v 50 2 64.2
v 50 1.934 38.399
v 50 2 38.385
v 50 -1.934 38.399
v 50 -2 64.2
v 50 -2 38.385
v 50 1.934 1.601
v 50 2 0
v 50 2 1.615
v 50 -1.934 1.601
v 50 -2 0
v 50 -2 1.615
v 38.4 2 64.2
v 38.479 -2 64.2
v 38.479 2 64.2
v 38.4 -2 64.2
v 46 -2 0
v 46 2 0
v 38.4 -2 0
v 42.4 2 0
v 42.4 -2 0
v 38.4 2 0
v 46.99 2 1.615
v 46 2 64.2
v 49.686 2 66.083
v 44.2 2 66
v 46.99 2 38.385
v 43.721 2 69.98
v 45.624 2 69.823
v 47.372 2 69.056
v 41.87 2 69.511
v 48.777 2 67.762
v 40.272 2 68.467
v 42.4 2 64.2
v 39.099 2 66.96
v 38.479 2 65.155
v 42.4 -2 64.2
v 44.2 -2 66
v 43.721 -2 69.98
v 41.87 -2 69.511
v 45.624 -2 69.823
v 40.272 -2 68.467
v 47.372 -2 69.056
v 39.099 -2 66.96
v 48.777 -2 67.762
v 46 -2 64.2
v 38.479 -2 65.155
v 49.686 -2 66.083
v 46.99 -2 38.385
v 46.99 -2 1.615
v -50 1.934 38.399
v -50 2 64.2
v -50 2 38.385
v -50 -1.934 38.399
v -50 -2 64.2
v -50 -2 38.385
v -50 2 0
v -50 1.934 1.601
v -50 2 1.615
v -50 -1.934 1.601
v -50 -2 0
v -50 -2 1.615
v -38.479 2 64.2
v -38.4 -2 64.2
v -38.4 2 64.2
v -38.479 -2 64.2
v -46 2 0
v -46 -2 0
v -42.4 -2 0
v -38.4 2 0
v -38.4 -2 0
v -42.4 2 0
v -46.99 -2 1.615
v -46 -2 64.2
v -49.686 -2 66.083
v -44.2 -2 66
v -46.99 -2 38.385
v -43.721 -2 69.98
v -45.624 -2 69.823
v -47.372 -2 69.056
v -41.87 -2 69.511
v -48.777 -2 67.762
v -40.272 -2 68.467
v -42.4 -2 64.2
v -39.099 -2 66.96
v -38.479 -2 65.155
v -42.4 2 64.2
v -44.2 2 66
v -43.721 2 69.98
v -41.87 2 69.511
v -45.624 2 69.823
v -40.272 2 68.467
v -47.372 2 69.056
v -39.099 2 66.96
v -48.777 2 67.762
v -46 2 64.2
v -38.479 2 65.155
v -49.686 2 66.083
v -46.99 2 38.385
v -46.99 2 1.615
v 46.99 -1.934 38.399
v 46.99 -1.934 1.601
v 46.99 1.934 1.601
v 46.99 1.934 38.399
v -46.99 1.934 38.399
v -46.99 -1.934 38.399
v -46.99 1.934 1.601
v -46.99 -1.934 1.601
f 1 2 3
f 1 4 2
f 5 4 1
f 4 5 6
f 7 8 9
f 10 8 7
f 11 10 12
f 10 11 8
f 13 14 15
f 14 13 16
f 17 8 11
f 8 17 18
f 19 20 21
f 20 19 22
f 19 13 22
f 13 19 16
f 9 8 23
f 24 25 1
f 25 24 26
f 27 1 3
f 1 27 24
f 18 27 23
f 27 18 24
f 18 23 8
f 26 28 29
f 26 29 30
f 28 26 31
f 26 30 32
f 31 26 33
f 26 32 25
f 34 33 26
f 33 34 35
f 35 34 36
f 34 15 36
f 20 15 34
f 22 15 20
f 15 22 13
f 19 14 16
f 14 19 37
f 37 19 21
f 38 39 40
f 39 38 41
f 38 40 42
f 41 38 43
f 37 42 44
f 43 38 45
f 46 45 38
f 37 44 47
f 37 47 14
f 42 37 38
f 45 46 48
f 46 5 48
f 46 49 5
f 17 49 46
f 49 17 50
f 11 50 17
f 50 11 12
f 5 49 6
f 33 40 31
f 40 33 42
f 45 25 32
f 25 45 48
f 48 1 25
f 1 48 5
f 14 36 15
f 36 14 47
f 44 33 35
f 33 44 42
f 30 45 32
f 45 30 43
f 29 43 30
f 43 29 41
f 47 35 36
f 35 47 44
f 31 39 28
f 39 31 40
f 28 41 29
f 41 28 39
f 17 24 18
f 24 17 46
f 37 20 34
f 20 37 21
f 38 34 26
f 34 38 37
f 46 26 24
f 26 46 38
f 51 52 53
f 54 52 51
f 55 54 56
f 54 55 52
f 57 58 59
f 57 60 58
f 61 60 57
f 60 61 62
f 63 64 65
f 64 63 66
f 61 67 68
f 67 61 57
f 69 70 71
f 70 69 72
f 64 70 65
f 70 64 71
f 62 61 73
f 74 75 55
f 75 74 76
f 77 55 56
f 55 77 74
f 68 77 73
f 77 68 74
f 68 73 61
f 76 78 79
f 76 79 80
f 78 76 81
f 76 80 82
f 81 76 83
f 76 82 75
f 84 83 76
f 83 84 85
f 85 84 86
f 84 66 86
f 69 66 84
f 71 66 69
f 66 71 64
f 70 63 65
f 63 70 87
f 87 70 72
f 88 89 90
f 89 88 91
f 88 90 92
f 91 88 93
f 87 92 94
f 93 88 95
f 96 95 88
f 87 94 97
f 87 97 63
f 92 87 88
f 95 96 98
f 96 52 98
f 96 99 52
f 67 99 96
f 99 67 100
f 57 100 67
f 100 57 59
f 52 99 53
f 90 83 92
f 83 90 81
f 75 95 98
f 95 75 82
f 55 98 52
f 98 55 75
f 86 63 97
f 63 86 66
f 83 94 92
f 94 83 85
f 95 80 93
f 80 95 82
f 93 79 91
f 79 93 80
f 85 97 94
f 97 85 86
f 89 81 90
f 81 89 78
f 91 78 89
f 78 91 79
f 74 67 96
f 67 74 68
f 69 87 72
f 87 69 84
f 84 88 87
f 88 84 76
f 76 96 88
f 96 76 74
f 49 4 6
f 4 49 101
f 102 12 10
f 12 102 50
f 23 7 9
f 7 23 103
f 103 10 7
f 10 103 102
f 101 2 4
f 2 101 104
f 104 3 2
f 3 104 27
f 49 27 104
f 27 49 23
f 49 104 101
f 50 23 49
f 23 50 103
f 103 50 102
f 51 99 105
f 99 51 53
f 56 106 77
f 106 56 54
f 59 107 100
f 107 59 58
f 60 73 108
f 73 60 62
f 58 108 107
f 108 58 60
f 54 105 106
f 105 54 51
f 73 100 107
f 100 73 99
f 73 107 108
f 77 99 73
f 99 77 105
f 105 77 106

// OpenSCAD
// file: teardrop.scad
// teardrop V2


module teardrop (r=4.5,h=20,top_and_bottom=false)
{
	rotate([-270,0,90])
	linear_extrude(height=h,convexity=10)
	{
		circle(r=r);
		polygon(points=[[0,0],[r*cos(30),r*sin(30)],[0.5*r,r],[-0.5*r,r],[-r*cos(30),r*sin(30)]],
				paths=[[0,1,2,3,4]]);
		if (top_and_bottom)
		polygon(points=[[0,0],[r*cos(30),-r*sin(30)],[0.5*r,-r],[-0.5*r,-r],[-r*cos(30),-r*sin(30)]],
				paths=[[0,1,2,3,4]]);

	}
}

module teardropFlat (r=4.5,h=20,top_and_bottom=false)
{
	rotate([-270,0,90])
	linear_extrude(height=h,convexity=10)
	{
		circle(r=r);
		polygon(points=[[0,0],[r*cos(20),r*sin(20)],[0.6*r,r],[-0.6*r,r],[-r*cos(20),r*sin(20)]],
				paths=[[0,1,2,3,4]]);
		if (top_and_bottom)
		polygon(points=[[0,0],[r*cos(20),-r*sin(20)],[0.5*r,-r],[-0.5*r,-r],[-r*cos(20),-r*sin(20)]],
				paths=[[0,1,2,3,4]]);

	}
}

module teardropcentering (r=4.5,h=20)
{
	rotate([-270,0,90])
	linear_extrude(height=h)
	{
		circle(r=r, $fn = 24);
		polygon(points=[[0,0],[r*cos(30),r*sin(30)],[0.5*r,1.2*r],[-0.5*r,1.2*r],[-r*cos(30),r*sin(30)]],
				paths=[[0,1,2,3,4]]);
	}
}

module teardropcentering2 (r=4.5,h=20)
{
	//rotate([-270,0,90])
	difference(){
	linear_extrude(height=h)
	{
		circle(r=r, $fn = 24);
		polygon(points=[[0,0],[r*cos(30),r*sin(30)],[0.5*r,1.2*r],[-0.5*r,1.2*r],[-r*cos(30),r*sin(30)]],
				paths=[[0,1,2,3,4]]);
	}
	translate(v = [-1.5*r, -1.5*r,-1])cube(size =[3*r,1.5*r,h+2]);
	}
}
// file: barbell.scad
/*
 *  This program is free software; you can redistribute it and/or modify
 *  it under the terms of the GNU General Public License as published by
 *  the Free Software Foundation; either version 3 of the License,
 *  LGPL version 2.1, or (at your option) any later version of the GPL.
 *
 *  This program is distributed in the hope that it will be useful,
 *  but WITHOUT ANY WARRANTY; without even the implied warranty of
 *  MERCHANTABILITY or FITNESS FOR A PARTICULAR PURPOSE.  See the
 *  GNU General Public License for more details.
 *
 *  You should have received a copy of the GNU General Public License
 *  along with this program; if not, write to the Free Software
 *  Foundation, Inc., 59 Temple Place, Suite 330, Boston, MA 02111-1307 USA
 *
*/

module barbell (r1,r2,r3,r4,separation) 
{
	x1=[0,0];
	x2=[separation,0];
	x3=triangulate (x1,x2,r1+r3,r2+r3);
	x4=triangulate (x2,x1,r2+r4,r1+r4);
	render()
	difference ()
	{
		union()
		{
			translate(x1)
			circle (r=r1);
			translate(x2)
			circle(r=r2);
			polygon (points=[x1,x3,x2,x4]);
		}
		translate(x3)
		circle(r=r3,$fa=5);
		translate(x4)
		circle(r=r4,$fa=5);
	}
}


function triangulate (point1, point2, length1, length2) = 
point1 + 
length1*rotated(
atan2(point2[1]-point1[1],point2[0]-point1[0])+
angle(distance(point1,point2),length1,length2));

function distance(point1,point2)=
sqrt((point1[0]-point2[0])*(point1[0]-point2[0])+
(point1[1]-point2[1])*(point1[1]-point2[1]));

function angle(a,b,c) = acos((a*a+b*b-c*c)/(2*a*b)); 

function rotated(a)=[cos(a),sin(a),0];
// file: utilities.scad
/*
 * Utility functions.
 *
 * Originally by Hans Häggström, 2010.
 * Dual licenced under Creative Commons Attribution-Share Alike 3.0 and LGPL2 or later
 */

//include <units.scad>


/******************** Disance Poins ******************************/
function distance3D(a,b) =sqrt( (a[0] - b[0])*(a[0] - b[0]) +
                                (a[1] - b[1])*(a[1] - b[1]) +
                                (a[2] - b[2])*(a[2] - b[2]) );
//Obsolet
function distance(a, b) = distance3D(a,b);

function distance2D(a,b) = sqrt( (a[0] - b[0])*(a[0] - b[0]) +
                                (a[1] - b[1])*(a[1] - b[1]));
								
function distance1D(a,b) = sqrt(a*a+b*b);
//Obsolet
function length2(a) = distance1D(a[0],a[1]);


/************************ vector *************************/
function normalized(a) = a / (max(distance3D([0,0,0], a), 0.00001));

function normalized_axis(a) = a == "x" ? [1, 0, 0]:
                   a == "y" ? [0, 1, 0]:
                   a == "z" ? [0, 0, 1]: normalized(a);

function angleOfNormalizedVector(n) = [0, -atan2(n[2], distance1D([n[0], n[1]])), atan2(n[1], n[0]) ];

function angle(v) = angleOfNormalizedVector(normalized(v));

function angleBetweenTwoPoints(a, b) = angle(normalized(b-a));

function _angleVectore2D(a) = atan2(a[0],a[1]);
function angle_betweentTwoPoints2D (a,b) = _angleVectore2D(b-a);


/********************** Circel ***************************/

function circel_area(r) = PI * r * r;

function circel_radius3Points(a,b,c) = (distance2D(a,b) * distance2D(b,c) * distance2D(c,a)) / (4 * triangle_area3Points(a,b,c));

function circel_radius3lengths(a,b,c) = (a*b*c) / (4 * triangle_area3lengths(a,b,c));


/********************** triangle **************************/
//Satz des Heron
function triangle_area3lengths(a,b,c) = sqrt((a+b+c)*(a+b-c)*(b+c-a)*(c+a-b))/4;

function triangle_area3Points(a,b,c) = triangle_area3lengths(distance2D(a,b),distance2D(b,c),distance2D(c,a));



/************************** coordinate systems translation ****/
//[radius,phi] <=> [x,y]
function conv2D_cartesian2polar(x) = [ distance1D(x[0],x[1]) , atan2(x[1],x[0]) ];
function conv2D_polar2cartesian(x) = [ x[0]*cos(x[1]) , x[0]*sin(x[1]) ];


CENTER = 0;
LEFT = -0.5;
RIGHT = 0.5;
TOP = 0.5;
BOTTOM = -0.5;

FlatCap =0;
ExtendedCap =0.5;
CutCap =-0.5;


module fromTo(from=[0,0,0], to=[1,0,0], size=[1, 1], align=[CENTER, CENTER], material=[0.5, 0.5, 0.5], name="", endExtras=[0,0], endCaps=[FlatCap, FlatCap], rotation=[0,0,0], printString=true) {

  angle = angleBetweenTwoPoints(from, to);
  length = distance(from, to) + endCaps[0]*size[0] + endCaps[1]*size[0] + endExtras[0] + endExtras[1];

  if (length > 0) {
    if (printString) echo(str( "  " ,name, " ", size[0], "mm x ", size[1], "mm, length ", length, "mm"));

    color(material)
      translate(from)
        rotate(angle)
          translate( [ -endCaps[0]*size[0] - endExtras[0], size[0]*(-0.5-align[0]), size[1]*(-0.5+align[1]) ] )
            rotate(rotation)
              scale([length, size[0], size[1]]) child();
  }
}

module part(name) {
  echo("");
  echo(str(name, ":"));
}
// file: roundEdges.scad
/* roundEdges
 * Copyright (c) 2012 by Krallinger Sebastian [s.krallinger+cc@gmail.com]
 * Dual-licensed under 
 * Creative Commons Attribution-ShareAlike 3.0 (CC BY-SA) [http://creativecommons.org/licenses/by-sa/3.0/]
 * and
 * LGPL v2 or later [http://www.gnu.org/licenses/].
 */


//Rounded Edges
module roundEdge(_a=0,_r=1,_l=1,_fn=100){
	rotate (a=[0,0,_a]){
		translate(v=[_r,_r,0]){
			rotate (a=[0,0,0]) rotate (a=[0,0,180]){
				difference() {
					translate (v=[-OS/2,-OS/2,-OS/2])
						cube (size = [_r+OS,_r+OS,_l+OS],center=false );
					translate (v=[0,0,-OS*2/2])
						cylinder (h = _l+OS*2, r=_r, center = false, $fn=_fn);
				}
			}
		}
	}
}
//roundEdge(_a=0,_l=10);
// file: metric.scad
// PRUSA Mendel  
// Default metric sizes
// GNU GPL v2
// Josef Průša
// josefprusa@me.com
// prusadjs.cz
// http://www.reprap.org/wiki/Prusa_Mendel
// http://github.com/prusajr/PrusaMendel

// RODS

threaded_rod_diameter      = 8.2;
smooth_bar_diameter        = 8;

// Nuts and bolts
// For all nuttraps and screw holse 
m8_diameter                = 8.9;
m8_nut_diameter            = 15.3;
m8_nut_wallDist            = _wallDistFromDia(m8_nut_diameter);
m8_nut_heigth              = 6.3;

m4_diameter                = 4.5;
m4_nut_diameter            = 8.2;
m4_nut_heigth              = 3.2;

m3_diameter                = 3.6;
m3_nut_diameter            = 6.45;
m3_nut_heigth              = 2.3;
m3_nut_wallDist            = _wallDistFromDia(m3_nut_diameter);
m3_nut_diameter_horizontal = 6.1;

// elongetaed nuttraps
// where a nut is put in an slot and inthere hits the perpendicular threadhole
m3_elongNtt_tolerance      = [0.5,0,0.5];// additional [diameter,depth,height]  // depth is not implemented

// linear Bearings
lber_length                = 24;
lber_diam                  = 15.3;

// Motors

motor_shaft                = 5.5;


/******************************************************************************/ 
/*                                  INTERNAL                                  */
/******************************************************************************/
/*-----------------!!! do not change things below this !!!--------------------*/
m3_elongNtt_diameter = m3_nut_diameter + m3_elongNtt_tolerance[0];
m3_elongNtt_wallDist = _wallDistFromDia(m3_elongNtt_diameter);
m3_elongNtt_height = m3_nut_heigth + m3_elongNtt_tolerance[2];



function _wallDistFromDia(dia) = cos(30)*dia;
// file: units.scad
/*
 * Basic units.
 * 
 * Originally by Hans Häggström, 2010.
 * Dual licenced under Creative Commons Attribution-Share Alike 3.0 and LGPL2 or later
 */


mm = 1;
cm = 10 * mm;
dm = 100 * mm;
m = 1000 * mm;

inch = 25.4 * mm;

X = [1, 0, 0];
Y = [0, 1, 0];
Z = [0, 0, 1];

M3 = 3*mm;
M4 = 4*mm;
M5 = 5*mm;
M6 = 6*mm;
M8 = 8*mm;


// When a small distance is needed to overlap shapes for boolean cutting, etc.
epsilon = 0.01*mm;
OS = epsilon;  // Over size
// file: config.scad
/* config [c]
 * Copyright (c) 2012 by Krallinger Sebastian [s.krallinger+cc@gmail.com]
 * Dual-licensed under 
 * Creative Commons Attribution-ShareAlike 3.0 (CC BY-SA) [http://creativecommons.org/licenses/by-sa/3.0/]
 * and
 * LGPL v2 or later [http://www.gnu.org/licenses/].
 */

/******************************************************************************/ 
/*                              Main configuration                            */
/******************************************************************************/

/*-----------------------------------x axis-----------------------------------*/
c_x_axis_length = 333; // usable lenth. If you use an extruder which is longer then the H-Xtruder-Mount.scad you have to add this overcut here.
c_x_axis_smoothRod_diam = 8.1;

c_x_axis_dist = 35;

/*-----------------------------------y axis-----------------------------------*/
c_y_axis_length = 333; // usable lenth. If your extruder nozzel exit is not center to the H-Xtruder-Mount.scad you have to add the offset here.
c_y_axis_smoothRod_diam = 8.1;
c_y_axis_tabel_zDirOffset = 14.321; // offset of the center of the y axis to the tabel contact plain

/*-----------------------------------z axis-----------------------------------*/
c_z_axis_length = 333; // usable lenth. If the nozzel of the extruder exids the lower edge of the H-X-Carriage.scad than you have to add the overcut here.
c_z_axis_smoothRod_diam = 12.2;

c_z_axis_rodsDist = 32; // distance between threded rod and smooth rod

/******************************************************************************/ 
/*                                  linear Bearings                           */
/******************************************************************************/
c_lber_length       = 24.2;
c_lber_diam         = 15.3;

/*-----------------------------------x axis-----------------------------------*/
c_xAxis_lber_length = c_lber_length;
c_xAxis_lber_diam   = c_lber_diam;
/*----------------------------------y axis------------------------------------*/
c_yAxis_lber_length = c_lber_length;
c_yAxis_lber_diam   = c_lber_diam;
/*----------------------------------z axis------------------------------------*/
c_zAxis_lber_length = c_lber_length;
c_zAxis_lber_diam   = 12 + c_lber_diam-8;

/******************************************************************************/ 
/*                                    BELT                                    */
/******************************************************************************/
c_belt_thickness      = 1.3;
c_belt_width          = 6;
c_belt_teethDist      = 2.5;
c_belt_teethDepth     = 0.7;

/*-----------------------------------x axis-----------------------------------*/
//belt
c_xAxis_belt_thickness      = c_belt_thickness;
c_xAxis_belt_width          = c_belt_width;
c_xAxis_belt_teethDist      = c_belt_teethDist;
c_xAxis_belt_teethDepth     = c_belt_teethDepth;

// pully
c_xAxis_pully_diam = 9-c_xAxis_belt_thickness*2; // innes (in the teeth molde) diameter of the pully

// diviater
c_xAxis_bearingDiviater_diam = 26; // diameter of the diviater (so the diameter of the centerpoint to the teeth top of the belt) 

// distances
c_xAxis_beltCenter_xAxisDist     = 38;
c_xAxis_beltCenter_motorScrewHoleDist     = 12;

c_xAxis_beltTop_topxAxisDist = -(c_x_axis_dist/2)+c_xAxis_pully_diam/2; // distece between center of the top x axis and toothed side of the belt in z dir

/*-----------------------------------y axis-----------------------------------*/
c_yAxis_belt_thickness      = c_belt_thickness;
c_yAxis_belt_width          = c_belt_width;
c_yAxis_belt_teethDist      = c_belt_teethDist;
c_yAxis_belt_teethDepth     = c_belt_teethDepth;

c_y_axis_beltCenter_zDirOffset = 14.6; // offset of the center of the belt to the tabel contact plain

/******************************************************************************/ 
/*                                  support                                   */
/******************************************************************************/
c_xDirSupp_thredRod_altitude    = [8.266,45.497];
c_xDirSupp_thredRod_zAxisDist   = 38.95-8.5;

/******************************************************************************/ 
/*                                  motor                                     */
/******************************************************************************/
c_motorShaft_diam            = 5; // motor axis diameter
c_motorShaft_length          = 25; // motor axis length from pilot
c_motorPilot_diam            = 27.5; // motor pilot diameter
c_motorScrewHole_diam        = 3.3; // motor screw holde diameter
c_motorScrewHoles_centerDist = 43.841/2; // motor holes distance from axis center
c_motor_sideLength           = 42.1; // length of the motor side (rectangular motor)

/*-----------------------------------x axis-----------------------------------*/
c_xAxis_motorShaft_diam            = c_motorShaft_diam;
c_xAxis_motorShaft_length          = c_motorShaft_length;
c_xAxis_motorPilot_diam            = c_motorPilot_diam ;
c_xAxis_motorScrewHole_diam        = c_motorScrewHole_diam ;
c_xAxis_motorScrewHoles_centerDist = c_motorScrewHoles_centerDist;
c_xAxis_motor_sideLength           = c_motor_sideLength;

/*-----------------------------------y axis-----------------------------------*/
c_yAxis_motorShaft_diam            = c_motorShaft_diam;
c_yAxis_motorShaft_length          = c_motorShaft_length;
c_yAxis_motorPilot_diam            = c_motorPilot_diam ;
c_yAxis_motorScrewHole_diam        = c_motorScrewHole_diam ;
c_yAxis_motorScrewHoles_centerDist = c_motorScrewHoles_centerDist;
c_yAxis_motor_sideLength           = c_motor_sideLength;

/*-----------------------------------z axis-----------------------------------*/
c_zAxis_motorShaft_diam            = c_motorShaft_diam;
c_zAxis_motorShaft_length          = c_motorShaft_length;
c_zAxis_motorPilot_diam            = c_motorPilot_diam ;
c_zAxis_motorScrewHole_diam        = c_motorScrewHole_diam ;
c_zAxis_motorScrewHoles_centerDist = c_motorScrewHoles_centerDist;
c_zAxis_motor_sideLength           = c_motor_sideLength;
// main file
/* H-Fan [f]
 * Copyright (c) 2012 by Krallinger Sebastian [s.krallinger+cc@gmail.com]
 * Dual-licensed under 
 * Creative Commons Attribution-ShareAlike 3.0 (CC BY-SA) [http://creativecommons.org/licenses/by-sa/3.0/]
 * and
 * LGPL v2 or later [http://www.gnu.org/licenses/].
 */

include <config.scad>
include <units.scad>;
include <metric.scad>
include <roundEdges.scad>
include <utilities.scad>
include <barbell.scad>
use <teardrop.scad>


/*------------------------------------general---------------------------------*/
f_mode = "-";  
//f_mode = "print";  $fn=24*4;  // can be print or inspect [overlays the Ybd_model with the original Ybd_model] (uncomment next line)
f_mode = "inspect";
//f_mode = "assembly";

f_thinWallThickness          = 1;
f_genWallThickness           = 1.5;
f_strongWallThickness        = 4;

f_horizontalSuportThickness  = 0.3;
f_verticalSupportThickness   = 0.5;


f_airChannal_segments = 12;

f_airChannal_outerR = 32;

f_fanSize = 40;

f_fanCenterOffset = 50;

f_fanHoles_centerDist = 45/2;
f_fanHoles_diam = 3.2;
f_fanHoles_nutDiam = 6.45;
f_fanHoles_nutHeight = 2.3;

f_fanHoles_nuttAddFree = 2.0;

f_screwFreeSpace = 6;


/*------------------------------------connector-------------------------------*/
f_conn_size = [f_strongWallThickness*2+m3_diameter,f_strongWallThickness,70];  // relative to z=0
f_connSlot_width = m3_diameter;


/******************************************************************************/ 
/*                                  INTERNAL                                  */
/******************************************************************************/

_f_nutFree_r = f_fanHoles_nutDiam/2+f_fanHoles_nuttAddFree;

module H_Fan() {
	// ari Channal
	difference() {
		union(){
			rotate_extrude(file = "fanOutlet.dxf", layer = "airCannal",origin =  [0,0], convexity = 10,$fn=f_airChannal_segments);

			//support walls
			intersection() {
				rotate_extrude(file = "fanOutlet.dxf", layer = "supportOutline",origin =  [0,0], convexity = 10,$fn=f_airChannal_segments);
				for (i=[0:360/f_airChannal_segments:180]) 
				rotate(a=i,v=Z) 
					cube(size=[100, f_thinWallThickness, 100], center=true);
			}

			//seperater wall
			intersection() {
				rotate_extrude(file = "fanOutlet.dxf", layer = "airCannal_outline",origin =  [0,0], convexity = 10,$fn=f_airChannal_segments);
					cube(size=[f_thinWallThickness,100, 100], center=true);
			}
			
		}
		union(){
			for (i=[0,180])
			rotate(a=i,v=Z) 
			{
				translate([0, 0, -OS]) 
				rotate(a=90,v=X)
					linear_extrude(file = "fanOutlet.dxf", layer = "fanConnector_outline",height = f_fanSize, center = true, convexity = 10, twist = 0);
			}

		}
	}
}

module H_FanConnector() {
	difference() {
		union(){
			//fan connetor outline
			for (i=[0,180]) 
			rotate(a=i,v=Z) 
			{
				//hull
				rotate(a=90,v=X)
					linear_extrude(file = "fanOutlet.dxf", layer = "fanConnector_hull",height = f_fanSize, center = true, convexity = 10, twist = 0);

				//walls
				for (i=[-f_fanSize/2+f_thinWallThickness/2,f_fanSize/2-f_thinWallThickness/2])
				translate([0, i, 0])  
				rotate(a=90,v=X)
					linear_extrude(file = "fanOutlet.dxf", layer = "fanConnector_outline",height = f_thinWallThickness, center = true, convexity = 10, twist = 0);

				intersection() {
					rotate(a=90,v=X)
						linear_extrude(file = "fanOutlet.dxf", layer = "fanConnector_outline",height = f_fanSize, center = true, convexity = 10, twist = 0);

					// sollid spots for screws
					translate([f_fanCenterOffset+OS, 0, f_fanSize/2]) 
					for (_a=[45:90:350]) 
					rotate(a=_a,v=X) 
					translate([0, f_fanHoles_centerDist+_f_nutFree_r,0]) 
					rotate(a=-90,v=Y) 
						cylinder(r1=_f_nutFree_r*2,r2=f_genWallThickness/2, h=27, center=false);	
				}

				difference() {
					union(){
						translate([f_fanCenterOffset- f_conn_size[0]/2, 0, f_conn_size[2]/2-f_conn_size[0]/4]) 
							cube(size=f_conn_size-[0,0,f_conn_size[0]/2], center=true);

						translate([f_fanCenterOffset- f_conn_size[0]/2, 0, f_conn_size[2]-f_conn_size[0]/2]) 
						rotate(a=90,v=X) 
							cylinder(r=f_conn_size[0]/2, h=f_conn_size[1], center=true);
					}
					union(){
						rotate(a=90,v=X)
							linear_extrude(file = "fanOutlet.dxf", layer = "fanConnector_outline",height = f_fanSize, center = true, convexity = 10, twist = 0);

						translate([f_fanCenterOffset- f_conn_size[0]/2, 0, f_conn_size[2]/2-f_conn_size[0]/4]) 
							cube(size=[f_connSlot_width,f_conn_size[1]+2*OS,f_conn_size[2]-f_conn_size[0]/2], center=true);

						translate([f_fanCenterOffset- f_conn_size[0]/2, 0, f_conn_size[2]-f_conn_size[0]/2]) 
						rotate(a=90,v=X) 
							cylinder(r=f_connSlot_width/2, h=f_conn_size[1]+2*OS, center=true,$fn=4);
					}
				}
				
				
			}
		}
		union(){
			for (i=[0,180])
			rotate(a=i,v=Z) {
				
				
				//fan round coutout
				rotate(a=90,v=X)
				translate([f_fanCenterOffset+OS, f_fanSize/2, 0]) 
				rotate(a=-90,v=Y) 
					cylinder(r=f_fanSize/2- f_genWallThickness, h=3+2*OS, center=false);

				// screw holes
				translate([f_fanCenterOffset+OS, 0, f_fanSize/2]) 
				for (_a=[45:90:350]) 
				rotate(a=_a,v=X) 
				translate([0, f_fanHoles_centerDist,0]) 
				rotate(a=-90,v=Y) 
					cylinder(r=f_fanHoles_diam/2, h=f_screwFreeSpace, center=false);	


				// sollid spots for screws
				difference() {
					union(){
						translate([f_fanCenterOffset , 0, f_fanSize/2]) 
						for (_a=[45:90:350]) 
						rotate(a=_a,v=X) 
						translate([0, f_fanHoles_centerDist+_f_nutFree_r + f_thinWallThickness,0]) 
						rotate(a=-90,v=Y) 
							cylinder(r1=_f_nutFree_r*2,r2=f_genWallThickness/2, h=27, center=false);
					}
					union(){
						translate([f_fanCenterOffset , 0, f_fanSize/2+OS]) 
							cube(size=[f_strongWallThickness, f_fanSize+2*OS,f_fanSize+2*OS], center=true);
					}
				}
			}
		}
	}
}



if (f_mode == "inspect") {
	H_Fan();
	H_FanConnector() ;
}
module H_Fan_print() {
	H_Fan();
}
if (f_mode == "print") {
	H_Fan_print();
}




/*------------------------------------assembly--------------------------------*/
module H_Fan_assembly() {
	H_Fan();
}

if (f_mode == "assembly"){
	H_Fan_assembly();
}
